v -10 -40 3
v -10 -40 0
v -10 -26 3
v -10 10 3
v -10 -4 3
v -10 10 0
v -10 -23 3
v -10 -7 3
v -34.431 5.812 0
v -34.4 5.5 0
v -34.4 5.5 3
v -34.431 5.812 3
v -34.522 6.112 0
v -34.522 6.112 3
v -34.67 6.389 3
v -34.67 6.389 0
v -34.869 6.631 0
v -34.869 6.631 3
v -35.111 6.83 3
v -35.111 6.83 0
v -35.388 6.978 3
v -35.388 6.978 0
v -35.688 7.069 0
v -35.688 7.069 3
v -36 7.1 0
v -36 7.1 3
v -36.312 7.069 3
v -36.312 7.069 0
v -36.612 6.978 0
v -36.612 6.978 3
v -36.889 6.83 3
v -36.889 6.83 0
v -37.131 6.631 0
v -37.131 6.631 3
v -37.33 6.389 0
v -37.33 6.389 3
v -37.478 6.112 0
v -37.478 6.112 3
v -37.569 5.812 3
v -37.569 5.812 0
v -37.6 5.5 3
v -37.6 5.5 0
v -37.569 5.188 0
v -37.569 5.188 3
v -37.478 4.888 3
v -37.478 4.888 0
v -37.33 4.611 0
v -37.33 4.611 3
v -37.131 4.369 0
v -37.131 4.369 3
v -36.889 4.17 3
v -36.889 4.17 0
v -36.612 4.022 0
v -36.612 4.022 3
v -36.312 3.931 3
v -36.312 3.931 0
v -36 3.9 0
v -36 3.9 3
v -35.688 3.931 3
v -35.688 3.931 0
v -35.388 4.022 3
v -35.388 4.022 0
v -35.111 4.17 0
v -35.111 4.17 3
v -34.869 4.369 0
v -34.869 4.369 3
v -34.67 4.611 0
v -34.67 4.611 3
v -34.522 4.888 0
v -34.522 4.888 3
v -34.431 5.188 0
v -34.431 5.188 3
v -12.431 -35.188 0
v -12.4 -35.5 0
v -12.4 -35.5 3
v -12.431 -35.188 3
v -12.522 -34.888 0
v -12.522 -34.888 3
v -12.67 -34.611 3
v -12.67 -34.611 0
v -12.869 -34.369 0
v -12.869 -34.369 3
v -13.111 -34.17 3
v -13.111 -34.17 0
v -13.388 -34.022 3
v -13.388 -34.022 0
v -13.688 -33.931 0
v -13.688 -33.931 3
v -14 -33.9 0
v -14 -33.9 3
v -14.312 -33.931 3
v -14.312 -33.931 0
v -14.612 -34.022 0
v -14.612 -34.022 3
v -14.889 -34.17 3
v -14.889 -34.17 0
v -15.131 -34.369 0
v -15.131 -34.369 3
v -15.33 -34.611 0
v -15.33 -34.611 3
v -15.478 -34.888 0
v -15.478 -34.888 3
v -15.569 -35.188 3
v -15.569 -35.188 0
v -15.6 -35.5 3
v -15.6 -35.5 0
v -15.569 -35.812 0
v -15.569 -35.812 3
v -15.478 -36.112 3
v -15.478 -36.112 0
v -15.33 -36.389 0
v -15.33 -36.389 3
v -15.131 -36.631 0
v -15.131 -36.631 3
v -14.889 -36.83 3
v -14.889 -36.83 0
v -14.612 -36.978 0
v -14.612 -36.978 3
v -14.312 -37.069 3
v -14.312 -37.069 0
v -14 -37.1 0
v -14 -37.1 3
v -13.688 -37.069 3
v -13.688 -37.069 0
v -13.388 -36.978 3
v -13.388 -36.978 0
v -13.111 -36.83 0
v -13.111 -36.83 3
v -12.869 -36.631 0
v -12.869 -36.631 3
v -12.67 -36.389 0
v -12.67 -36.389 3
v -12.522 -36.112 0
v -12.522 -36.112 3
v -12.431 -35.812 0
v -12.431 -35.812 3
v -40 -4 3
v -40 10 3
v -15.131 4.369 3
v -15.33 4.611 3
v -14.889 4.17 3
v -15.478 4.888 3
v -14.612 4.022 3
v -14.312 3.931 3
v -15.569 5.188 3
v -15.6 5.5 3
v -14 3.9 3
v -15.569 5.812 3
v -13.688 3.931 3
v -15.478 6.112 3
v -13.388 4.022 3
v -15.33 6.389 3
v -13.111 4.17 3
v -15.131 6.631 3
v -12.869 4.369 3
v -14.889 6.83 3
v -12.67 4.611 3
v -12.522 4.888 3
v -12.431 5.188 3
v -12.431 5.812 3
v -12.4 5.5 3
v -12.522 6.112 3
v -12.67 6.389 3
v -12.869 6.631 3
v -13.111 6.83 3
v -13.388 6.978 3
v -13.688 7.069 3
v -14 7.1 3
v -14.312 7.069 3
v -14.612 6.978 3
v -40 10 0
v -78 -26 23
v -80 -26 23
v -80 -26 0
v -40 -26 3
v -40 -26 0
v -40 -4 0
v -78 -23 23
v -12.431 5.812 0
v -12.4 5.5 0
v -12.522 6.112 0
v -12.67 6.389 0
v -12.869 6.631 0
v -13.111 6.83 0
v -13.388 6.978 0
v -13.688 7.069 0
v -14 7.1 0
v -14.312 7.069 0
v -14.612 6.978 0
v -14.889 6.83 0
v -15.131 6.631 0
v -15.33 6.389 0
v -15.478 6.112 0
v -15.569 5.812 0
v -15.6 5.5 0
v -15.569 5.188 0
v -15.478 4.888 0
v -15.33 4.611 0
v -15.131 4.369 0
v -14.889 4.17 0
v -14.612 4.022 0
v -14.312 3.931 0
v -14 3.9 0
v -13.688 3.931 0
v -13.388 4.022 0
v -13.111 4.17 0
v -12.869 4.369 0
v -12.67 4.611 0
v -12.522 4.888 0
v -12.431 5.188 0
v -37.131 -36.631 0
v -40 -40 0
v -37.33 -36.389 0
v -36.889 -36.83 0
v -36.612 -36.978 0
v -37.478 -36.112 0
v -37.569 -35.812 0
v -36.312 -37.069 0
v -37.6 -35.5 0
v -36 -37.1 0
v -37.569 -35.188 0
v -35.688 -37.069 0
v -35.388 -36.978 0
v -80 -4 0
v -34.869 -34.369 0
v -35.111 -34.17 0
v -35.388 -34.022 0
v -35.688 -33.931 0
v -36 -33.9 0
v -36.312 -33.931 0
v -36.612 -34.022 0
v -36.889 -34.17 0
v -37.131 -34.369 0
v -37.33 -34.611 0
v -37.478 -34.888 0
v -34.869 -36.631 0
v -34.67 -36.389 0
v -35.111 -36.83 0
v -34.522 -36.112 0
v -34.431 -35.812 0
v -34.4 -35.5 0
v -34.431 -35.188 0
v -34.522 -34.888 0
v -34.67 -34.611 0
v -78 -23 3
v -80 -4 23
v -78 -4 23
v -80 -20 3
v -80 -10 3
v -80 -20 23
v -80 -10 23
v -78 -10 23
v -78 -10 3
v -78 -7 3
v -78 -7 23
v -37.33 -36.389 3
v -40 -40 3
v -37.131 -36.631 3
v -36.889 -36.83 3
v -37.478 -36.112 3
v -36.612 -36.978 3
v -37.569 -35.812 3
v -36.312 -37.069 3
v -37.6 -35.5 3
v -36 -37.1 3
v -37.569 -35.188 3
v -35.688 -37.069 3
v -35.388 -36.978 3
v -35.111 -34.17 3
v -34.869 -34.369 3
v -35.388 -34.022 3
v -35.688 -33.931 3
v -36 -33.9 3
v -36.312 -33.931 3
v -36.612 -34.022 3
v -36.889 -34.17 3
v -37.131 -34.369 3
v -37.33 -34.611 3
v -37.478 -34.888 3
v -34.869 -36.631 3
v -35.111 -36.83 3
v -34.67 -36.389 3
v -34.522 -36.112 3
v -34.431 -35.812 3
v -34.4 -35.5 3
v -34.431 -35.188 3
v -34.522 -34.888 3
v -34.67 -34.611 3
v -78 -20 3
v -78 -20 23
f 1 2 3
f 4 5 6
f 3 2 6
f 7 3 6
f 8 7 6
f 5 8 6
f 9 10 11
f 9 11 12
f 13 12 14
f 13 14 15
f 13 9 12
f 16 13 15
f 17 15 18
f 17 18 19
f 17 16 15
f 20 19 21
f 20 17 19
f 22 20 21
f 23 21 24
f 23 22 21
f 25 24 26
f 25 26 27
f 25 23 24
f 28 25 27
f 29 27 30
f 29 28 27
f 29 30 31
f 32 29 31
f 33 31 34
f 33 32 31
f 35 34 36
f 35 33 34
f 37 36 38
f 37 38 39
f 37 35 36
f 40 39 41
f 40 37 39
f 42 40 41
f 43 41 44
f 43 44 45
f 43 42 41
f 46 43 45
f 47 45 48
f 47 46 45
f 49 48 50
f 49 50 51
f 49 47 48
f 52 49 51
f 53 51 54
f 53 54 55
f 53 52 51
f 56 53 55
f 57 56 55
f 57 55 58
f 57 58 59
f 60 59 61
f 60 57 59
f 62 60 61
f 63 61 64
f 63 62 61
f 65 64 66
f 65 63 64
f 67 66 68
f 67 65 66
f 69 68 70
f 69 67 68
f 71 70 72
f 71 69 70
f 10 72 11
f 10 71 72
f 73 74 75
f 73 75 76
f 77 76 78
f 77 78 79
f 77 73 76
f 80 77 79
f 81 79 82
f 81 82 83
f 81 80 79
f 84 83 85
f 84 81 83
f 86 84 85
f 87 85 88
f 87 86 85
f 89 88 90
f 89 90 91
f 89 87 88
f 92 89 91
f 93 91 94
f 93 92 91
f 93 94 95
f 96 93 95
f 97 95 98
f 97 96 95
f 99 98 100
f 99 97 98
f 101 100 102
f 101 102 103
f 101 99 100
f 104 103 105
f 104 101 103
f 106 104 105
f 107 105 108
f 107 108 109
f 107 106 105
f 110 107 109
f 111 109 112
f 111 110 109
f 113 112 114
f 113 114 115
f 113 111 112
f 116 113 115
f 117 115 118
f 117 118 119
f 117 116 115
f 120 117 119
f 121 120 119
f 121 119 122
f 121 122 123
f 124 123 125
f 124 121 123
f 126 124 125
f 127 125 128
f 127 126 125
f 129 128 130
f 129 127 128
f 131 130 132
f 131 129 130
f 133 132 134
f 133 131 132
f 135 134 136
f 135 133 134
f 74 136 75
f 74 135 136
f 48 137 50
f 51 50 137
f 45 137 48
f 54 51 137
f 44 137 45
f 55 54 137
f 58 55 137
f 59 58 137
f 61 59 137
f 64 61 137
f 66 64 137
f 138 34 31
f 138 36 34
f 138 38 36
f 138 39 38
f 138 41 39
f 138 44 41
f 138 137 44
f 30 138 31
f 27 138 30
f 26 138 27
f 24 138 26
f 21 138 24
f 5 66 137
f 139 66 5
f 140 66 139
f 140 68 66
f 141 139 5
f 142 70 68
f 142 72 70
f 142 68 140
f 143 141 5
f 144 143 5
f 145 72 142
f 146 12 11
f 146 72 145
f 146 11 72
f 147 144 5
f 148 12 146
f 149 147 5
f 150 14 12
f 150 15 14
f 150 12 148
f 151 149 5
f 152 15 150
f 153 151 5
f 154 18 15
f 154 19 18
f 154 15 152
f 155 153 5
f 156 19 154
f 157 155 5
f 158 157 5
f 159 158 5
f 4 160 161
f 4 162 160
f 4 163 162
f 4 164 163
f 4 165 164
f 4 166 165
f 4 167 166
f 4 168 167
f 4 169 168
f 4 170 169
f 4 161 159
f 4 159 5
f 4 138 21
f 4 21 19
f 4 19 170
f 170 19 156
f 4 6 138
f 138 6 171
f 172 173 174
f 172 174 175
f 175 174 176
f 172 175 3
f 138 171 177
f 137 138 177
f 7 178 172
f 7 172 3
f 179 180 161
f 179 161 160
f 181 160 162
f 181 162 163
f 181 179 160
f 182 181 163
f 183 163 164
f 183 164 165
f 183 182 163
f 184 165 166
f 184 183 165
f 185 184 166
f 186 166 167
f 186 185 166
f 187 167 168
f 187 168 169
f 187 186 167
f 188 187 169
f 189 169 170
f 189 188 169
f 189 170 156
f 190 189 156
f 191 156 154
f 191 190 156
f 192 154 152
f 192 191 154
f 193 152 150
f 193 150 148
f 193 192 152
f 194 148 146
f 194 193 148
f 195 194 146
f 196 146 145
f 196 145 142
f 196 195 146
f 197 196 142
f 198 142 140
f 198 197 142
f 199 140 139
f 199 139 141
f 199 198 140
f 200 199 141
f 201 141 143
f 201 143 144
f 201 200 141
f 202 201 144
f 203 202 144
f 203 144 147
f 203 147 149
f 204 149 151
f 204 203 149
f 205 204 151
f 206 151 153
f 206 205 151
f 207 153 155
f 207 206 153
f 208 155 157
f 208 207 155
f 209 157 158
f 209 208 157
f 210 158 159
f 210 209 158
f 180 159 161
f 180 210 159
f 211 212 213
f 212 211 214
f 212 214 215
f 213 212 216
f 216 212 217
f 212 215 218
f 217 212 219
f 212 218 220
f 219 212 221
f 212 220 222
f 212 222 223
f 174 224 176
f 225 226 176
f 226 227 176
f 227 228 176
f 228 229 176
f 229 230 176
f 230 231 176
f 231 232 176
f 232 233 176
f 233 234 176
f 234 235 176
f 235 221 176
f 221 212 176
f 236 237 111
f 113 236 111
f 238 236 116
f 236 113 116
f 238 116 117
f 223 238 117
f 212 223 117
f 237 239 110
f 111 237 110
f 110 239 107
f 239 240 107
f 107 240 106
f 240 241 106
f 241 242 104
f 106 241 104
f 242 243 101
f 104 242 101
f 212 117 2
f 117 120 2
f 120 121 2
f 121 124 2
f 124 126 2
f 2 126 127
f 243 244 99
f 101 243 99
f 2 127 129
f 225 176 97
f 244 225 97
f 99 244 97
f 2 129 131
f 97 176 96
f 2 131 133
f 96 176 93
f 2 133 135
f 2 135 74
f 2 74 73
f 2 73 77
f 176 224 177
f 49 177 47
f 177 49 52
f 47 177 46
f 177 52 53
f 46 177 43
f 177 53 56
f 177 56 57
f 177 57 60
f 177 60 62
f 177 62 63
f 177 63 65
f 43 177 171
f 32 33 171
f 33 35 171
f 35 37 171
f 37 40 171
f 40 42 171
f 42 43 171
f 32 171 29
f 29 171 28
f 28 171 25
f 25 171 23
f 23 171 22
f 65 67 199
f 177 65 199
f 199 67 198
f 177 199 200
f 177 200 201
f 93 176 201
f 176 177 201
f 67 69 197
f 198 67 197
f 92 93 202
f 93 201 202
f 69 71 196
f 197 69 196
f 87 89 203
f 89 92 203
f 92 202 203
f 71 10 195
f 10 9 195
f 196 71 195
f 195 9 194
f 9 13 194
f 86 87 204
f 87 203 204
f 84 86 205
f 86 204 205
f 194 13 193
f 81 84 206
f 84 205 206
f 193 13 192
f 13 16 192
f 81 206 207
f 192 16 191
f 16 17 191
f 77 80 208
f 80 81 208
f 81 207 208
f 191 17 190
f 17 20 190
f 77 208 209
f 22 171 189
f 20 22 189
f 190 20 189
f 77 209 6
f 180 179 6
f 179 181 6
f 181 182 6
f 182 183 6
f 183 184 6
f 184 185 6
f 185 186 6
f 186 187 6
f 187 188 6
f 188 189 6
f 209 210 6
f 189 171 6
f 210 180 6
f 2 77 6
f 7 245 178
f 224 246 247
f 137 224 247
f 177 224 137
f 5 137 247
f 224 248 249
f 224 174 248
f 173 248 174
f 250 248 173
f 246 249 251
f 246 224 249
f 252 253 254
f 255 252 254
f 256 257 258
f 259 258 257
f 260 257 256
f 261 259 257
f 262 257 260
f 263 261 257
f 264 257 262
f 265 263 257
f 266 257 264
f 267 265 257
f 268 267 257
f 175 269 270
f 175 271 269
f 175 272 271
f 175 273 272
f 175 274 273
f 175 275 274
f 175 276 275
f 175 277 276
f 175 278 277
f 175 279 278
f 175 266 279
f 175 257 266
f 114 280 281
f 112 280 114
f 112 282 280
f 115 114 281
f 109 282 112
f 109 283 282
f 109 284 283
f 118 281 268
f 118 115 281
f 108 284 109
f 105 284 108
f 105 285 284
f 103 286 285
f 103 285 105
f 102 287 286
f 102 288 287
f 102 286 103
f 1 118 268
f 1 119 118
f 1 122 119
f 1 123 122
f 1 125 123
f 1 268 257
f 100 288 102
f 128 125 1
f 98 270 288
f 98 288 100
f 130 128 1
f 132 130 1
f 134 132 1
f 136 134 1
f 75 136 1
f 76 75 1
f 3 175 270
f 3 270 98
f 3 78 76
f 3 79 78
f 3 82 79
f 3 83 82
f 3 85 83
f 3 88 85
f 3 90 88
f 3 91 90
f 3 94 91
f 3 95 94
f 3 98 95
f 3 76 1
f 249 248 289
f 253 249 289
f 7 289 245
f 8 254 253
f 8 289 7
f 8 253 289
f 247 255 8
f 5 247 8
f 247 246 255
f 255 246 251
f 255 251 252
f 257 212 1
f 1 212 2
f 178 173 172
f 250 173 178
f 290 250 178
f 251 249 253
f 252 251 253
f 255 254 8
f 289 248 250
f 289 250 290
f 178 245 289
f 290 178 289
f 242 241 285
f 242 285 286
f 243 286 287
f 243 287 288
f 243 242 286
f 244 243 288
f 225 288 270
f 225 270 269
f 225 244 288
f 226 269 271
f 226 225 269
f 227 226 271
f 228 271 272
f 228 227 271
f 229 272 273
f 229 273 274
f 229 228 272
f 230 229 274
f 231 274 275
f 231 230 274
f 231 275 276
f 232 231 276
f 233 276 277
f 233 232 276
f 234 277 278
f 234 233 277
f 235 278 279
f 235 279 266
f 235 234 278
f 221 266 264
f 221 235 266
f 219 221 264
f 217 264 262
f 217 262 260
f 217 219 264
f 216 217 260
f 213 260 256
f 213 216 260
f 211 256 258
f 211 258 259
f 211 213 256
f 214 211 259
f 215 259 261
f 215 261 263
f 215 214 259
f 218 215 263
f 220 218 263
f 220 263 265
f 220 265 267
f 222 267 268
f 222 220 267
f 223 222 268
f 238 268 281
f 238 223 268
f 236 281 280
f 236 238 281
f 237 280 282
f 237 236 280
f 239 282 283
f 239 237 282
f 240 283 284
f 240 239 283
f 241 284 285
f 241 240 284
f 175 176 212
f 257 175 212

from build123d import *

# Parameters (mm, degrees)
SKETCH_1_R      = 1.6
EXTRUDE_1_DEPTH = 3
SKETCH_5_W      = 2
SKETCH_5_H      = 3
EXTRUDE_3_DEPTH = 20
EXTRUDE_4_DEPTH = 3


with BuildPart() as part:
    # 草图1 → 凸台-拉伸1 (new body)
    with BuildSketch(Plane.XY):
        Polygon((-10, 10), (-40, 10), (-40, -7), (-80, -7), (-80, -23), (-40, -23), (-40, -40), (-10, -40), align=None)
        with Locations((-14, -35.5)):
            Circle(SKETCH_1_R, mode=Mode.SUBTRACT)
        with Locations((-36, 5.5)):
            Circle(SKETCH_1_R, mode=Mode.SUBTRACT)
        with Locations((-36, -35.5)):
            Circle(SKETCH_1_R, mode=Mode.SUBTRACT)
        with Locations((-14, 5.5)):
            Circle(SKETCH_1_R, mode=Mode.SUBTRACT)
    extrude(amount=EXTRUDE_1_DEPTH)

    # 草图5 → 凸台-拉伸3 (add)
    with BuildSketch(Plane.XY.offset(3)):
        with Locations((-79, -21.5)):
            Rectangle(SKETCH_5_W, SKETCH_5_H)
        with Locations((-79, -8.5)):
            Rectangle(SKETCH_5_W, SKETCH_5_H)
    extrude(amount=EXTRUDE_3_DEPTH)

    # 草图7 → 凸台-拉伸4 (add)
    with BuildSketch(Plane(origin=(0, -7, 0), x_dir=(1, 0, 0), z_dir=(0, 1, 0))):
        Polygon((-78, -23), (-10, -3), (-40, -3), (-40, 0), (-80, 0), (-80, -23), align=None)
    extrude_4 = extrude(amount=EXTRUDE_4_DEPTH)

    # 镜向1: 凸台-拉伸4 across plane
    add(extrude_4.mirror(Plane(origin=(0, -15, 0), x_dir=(0, 0, 1), z_dir=(0, -1, 0))))


solid = part.part
